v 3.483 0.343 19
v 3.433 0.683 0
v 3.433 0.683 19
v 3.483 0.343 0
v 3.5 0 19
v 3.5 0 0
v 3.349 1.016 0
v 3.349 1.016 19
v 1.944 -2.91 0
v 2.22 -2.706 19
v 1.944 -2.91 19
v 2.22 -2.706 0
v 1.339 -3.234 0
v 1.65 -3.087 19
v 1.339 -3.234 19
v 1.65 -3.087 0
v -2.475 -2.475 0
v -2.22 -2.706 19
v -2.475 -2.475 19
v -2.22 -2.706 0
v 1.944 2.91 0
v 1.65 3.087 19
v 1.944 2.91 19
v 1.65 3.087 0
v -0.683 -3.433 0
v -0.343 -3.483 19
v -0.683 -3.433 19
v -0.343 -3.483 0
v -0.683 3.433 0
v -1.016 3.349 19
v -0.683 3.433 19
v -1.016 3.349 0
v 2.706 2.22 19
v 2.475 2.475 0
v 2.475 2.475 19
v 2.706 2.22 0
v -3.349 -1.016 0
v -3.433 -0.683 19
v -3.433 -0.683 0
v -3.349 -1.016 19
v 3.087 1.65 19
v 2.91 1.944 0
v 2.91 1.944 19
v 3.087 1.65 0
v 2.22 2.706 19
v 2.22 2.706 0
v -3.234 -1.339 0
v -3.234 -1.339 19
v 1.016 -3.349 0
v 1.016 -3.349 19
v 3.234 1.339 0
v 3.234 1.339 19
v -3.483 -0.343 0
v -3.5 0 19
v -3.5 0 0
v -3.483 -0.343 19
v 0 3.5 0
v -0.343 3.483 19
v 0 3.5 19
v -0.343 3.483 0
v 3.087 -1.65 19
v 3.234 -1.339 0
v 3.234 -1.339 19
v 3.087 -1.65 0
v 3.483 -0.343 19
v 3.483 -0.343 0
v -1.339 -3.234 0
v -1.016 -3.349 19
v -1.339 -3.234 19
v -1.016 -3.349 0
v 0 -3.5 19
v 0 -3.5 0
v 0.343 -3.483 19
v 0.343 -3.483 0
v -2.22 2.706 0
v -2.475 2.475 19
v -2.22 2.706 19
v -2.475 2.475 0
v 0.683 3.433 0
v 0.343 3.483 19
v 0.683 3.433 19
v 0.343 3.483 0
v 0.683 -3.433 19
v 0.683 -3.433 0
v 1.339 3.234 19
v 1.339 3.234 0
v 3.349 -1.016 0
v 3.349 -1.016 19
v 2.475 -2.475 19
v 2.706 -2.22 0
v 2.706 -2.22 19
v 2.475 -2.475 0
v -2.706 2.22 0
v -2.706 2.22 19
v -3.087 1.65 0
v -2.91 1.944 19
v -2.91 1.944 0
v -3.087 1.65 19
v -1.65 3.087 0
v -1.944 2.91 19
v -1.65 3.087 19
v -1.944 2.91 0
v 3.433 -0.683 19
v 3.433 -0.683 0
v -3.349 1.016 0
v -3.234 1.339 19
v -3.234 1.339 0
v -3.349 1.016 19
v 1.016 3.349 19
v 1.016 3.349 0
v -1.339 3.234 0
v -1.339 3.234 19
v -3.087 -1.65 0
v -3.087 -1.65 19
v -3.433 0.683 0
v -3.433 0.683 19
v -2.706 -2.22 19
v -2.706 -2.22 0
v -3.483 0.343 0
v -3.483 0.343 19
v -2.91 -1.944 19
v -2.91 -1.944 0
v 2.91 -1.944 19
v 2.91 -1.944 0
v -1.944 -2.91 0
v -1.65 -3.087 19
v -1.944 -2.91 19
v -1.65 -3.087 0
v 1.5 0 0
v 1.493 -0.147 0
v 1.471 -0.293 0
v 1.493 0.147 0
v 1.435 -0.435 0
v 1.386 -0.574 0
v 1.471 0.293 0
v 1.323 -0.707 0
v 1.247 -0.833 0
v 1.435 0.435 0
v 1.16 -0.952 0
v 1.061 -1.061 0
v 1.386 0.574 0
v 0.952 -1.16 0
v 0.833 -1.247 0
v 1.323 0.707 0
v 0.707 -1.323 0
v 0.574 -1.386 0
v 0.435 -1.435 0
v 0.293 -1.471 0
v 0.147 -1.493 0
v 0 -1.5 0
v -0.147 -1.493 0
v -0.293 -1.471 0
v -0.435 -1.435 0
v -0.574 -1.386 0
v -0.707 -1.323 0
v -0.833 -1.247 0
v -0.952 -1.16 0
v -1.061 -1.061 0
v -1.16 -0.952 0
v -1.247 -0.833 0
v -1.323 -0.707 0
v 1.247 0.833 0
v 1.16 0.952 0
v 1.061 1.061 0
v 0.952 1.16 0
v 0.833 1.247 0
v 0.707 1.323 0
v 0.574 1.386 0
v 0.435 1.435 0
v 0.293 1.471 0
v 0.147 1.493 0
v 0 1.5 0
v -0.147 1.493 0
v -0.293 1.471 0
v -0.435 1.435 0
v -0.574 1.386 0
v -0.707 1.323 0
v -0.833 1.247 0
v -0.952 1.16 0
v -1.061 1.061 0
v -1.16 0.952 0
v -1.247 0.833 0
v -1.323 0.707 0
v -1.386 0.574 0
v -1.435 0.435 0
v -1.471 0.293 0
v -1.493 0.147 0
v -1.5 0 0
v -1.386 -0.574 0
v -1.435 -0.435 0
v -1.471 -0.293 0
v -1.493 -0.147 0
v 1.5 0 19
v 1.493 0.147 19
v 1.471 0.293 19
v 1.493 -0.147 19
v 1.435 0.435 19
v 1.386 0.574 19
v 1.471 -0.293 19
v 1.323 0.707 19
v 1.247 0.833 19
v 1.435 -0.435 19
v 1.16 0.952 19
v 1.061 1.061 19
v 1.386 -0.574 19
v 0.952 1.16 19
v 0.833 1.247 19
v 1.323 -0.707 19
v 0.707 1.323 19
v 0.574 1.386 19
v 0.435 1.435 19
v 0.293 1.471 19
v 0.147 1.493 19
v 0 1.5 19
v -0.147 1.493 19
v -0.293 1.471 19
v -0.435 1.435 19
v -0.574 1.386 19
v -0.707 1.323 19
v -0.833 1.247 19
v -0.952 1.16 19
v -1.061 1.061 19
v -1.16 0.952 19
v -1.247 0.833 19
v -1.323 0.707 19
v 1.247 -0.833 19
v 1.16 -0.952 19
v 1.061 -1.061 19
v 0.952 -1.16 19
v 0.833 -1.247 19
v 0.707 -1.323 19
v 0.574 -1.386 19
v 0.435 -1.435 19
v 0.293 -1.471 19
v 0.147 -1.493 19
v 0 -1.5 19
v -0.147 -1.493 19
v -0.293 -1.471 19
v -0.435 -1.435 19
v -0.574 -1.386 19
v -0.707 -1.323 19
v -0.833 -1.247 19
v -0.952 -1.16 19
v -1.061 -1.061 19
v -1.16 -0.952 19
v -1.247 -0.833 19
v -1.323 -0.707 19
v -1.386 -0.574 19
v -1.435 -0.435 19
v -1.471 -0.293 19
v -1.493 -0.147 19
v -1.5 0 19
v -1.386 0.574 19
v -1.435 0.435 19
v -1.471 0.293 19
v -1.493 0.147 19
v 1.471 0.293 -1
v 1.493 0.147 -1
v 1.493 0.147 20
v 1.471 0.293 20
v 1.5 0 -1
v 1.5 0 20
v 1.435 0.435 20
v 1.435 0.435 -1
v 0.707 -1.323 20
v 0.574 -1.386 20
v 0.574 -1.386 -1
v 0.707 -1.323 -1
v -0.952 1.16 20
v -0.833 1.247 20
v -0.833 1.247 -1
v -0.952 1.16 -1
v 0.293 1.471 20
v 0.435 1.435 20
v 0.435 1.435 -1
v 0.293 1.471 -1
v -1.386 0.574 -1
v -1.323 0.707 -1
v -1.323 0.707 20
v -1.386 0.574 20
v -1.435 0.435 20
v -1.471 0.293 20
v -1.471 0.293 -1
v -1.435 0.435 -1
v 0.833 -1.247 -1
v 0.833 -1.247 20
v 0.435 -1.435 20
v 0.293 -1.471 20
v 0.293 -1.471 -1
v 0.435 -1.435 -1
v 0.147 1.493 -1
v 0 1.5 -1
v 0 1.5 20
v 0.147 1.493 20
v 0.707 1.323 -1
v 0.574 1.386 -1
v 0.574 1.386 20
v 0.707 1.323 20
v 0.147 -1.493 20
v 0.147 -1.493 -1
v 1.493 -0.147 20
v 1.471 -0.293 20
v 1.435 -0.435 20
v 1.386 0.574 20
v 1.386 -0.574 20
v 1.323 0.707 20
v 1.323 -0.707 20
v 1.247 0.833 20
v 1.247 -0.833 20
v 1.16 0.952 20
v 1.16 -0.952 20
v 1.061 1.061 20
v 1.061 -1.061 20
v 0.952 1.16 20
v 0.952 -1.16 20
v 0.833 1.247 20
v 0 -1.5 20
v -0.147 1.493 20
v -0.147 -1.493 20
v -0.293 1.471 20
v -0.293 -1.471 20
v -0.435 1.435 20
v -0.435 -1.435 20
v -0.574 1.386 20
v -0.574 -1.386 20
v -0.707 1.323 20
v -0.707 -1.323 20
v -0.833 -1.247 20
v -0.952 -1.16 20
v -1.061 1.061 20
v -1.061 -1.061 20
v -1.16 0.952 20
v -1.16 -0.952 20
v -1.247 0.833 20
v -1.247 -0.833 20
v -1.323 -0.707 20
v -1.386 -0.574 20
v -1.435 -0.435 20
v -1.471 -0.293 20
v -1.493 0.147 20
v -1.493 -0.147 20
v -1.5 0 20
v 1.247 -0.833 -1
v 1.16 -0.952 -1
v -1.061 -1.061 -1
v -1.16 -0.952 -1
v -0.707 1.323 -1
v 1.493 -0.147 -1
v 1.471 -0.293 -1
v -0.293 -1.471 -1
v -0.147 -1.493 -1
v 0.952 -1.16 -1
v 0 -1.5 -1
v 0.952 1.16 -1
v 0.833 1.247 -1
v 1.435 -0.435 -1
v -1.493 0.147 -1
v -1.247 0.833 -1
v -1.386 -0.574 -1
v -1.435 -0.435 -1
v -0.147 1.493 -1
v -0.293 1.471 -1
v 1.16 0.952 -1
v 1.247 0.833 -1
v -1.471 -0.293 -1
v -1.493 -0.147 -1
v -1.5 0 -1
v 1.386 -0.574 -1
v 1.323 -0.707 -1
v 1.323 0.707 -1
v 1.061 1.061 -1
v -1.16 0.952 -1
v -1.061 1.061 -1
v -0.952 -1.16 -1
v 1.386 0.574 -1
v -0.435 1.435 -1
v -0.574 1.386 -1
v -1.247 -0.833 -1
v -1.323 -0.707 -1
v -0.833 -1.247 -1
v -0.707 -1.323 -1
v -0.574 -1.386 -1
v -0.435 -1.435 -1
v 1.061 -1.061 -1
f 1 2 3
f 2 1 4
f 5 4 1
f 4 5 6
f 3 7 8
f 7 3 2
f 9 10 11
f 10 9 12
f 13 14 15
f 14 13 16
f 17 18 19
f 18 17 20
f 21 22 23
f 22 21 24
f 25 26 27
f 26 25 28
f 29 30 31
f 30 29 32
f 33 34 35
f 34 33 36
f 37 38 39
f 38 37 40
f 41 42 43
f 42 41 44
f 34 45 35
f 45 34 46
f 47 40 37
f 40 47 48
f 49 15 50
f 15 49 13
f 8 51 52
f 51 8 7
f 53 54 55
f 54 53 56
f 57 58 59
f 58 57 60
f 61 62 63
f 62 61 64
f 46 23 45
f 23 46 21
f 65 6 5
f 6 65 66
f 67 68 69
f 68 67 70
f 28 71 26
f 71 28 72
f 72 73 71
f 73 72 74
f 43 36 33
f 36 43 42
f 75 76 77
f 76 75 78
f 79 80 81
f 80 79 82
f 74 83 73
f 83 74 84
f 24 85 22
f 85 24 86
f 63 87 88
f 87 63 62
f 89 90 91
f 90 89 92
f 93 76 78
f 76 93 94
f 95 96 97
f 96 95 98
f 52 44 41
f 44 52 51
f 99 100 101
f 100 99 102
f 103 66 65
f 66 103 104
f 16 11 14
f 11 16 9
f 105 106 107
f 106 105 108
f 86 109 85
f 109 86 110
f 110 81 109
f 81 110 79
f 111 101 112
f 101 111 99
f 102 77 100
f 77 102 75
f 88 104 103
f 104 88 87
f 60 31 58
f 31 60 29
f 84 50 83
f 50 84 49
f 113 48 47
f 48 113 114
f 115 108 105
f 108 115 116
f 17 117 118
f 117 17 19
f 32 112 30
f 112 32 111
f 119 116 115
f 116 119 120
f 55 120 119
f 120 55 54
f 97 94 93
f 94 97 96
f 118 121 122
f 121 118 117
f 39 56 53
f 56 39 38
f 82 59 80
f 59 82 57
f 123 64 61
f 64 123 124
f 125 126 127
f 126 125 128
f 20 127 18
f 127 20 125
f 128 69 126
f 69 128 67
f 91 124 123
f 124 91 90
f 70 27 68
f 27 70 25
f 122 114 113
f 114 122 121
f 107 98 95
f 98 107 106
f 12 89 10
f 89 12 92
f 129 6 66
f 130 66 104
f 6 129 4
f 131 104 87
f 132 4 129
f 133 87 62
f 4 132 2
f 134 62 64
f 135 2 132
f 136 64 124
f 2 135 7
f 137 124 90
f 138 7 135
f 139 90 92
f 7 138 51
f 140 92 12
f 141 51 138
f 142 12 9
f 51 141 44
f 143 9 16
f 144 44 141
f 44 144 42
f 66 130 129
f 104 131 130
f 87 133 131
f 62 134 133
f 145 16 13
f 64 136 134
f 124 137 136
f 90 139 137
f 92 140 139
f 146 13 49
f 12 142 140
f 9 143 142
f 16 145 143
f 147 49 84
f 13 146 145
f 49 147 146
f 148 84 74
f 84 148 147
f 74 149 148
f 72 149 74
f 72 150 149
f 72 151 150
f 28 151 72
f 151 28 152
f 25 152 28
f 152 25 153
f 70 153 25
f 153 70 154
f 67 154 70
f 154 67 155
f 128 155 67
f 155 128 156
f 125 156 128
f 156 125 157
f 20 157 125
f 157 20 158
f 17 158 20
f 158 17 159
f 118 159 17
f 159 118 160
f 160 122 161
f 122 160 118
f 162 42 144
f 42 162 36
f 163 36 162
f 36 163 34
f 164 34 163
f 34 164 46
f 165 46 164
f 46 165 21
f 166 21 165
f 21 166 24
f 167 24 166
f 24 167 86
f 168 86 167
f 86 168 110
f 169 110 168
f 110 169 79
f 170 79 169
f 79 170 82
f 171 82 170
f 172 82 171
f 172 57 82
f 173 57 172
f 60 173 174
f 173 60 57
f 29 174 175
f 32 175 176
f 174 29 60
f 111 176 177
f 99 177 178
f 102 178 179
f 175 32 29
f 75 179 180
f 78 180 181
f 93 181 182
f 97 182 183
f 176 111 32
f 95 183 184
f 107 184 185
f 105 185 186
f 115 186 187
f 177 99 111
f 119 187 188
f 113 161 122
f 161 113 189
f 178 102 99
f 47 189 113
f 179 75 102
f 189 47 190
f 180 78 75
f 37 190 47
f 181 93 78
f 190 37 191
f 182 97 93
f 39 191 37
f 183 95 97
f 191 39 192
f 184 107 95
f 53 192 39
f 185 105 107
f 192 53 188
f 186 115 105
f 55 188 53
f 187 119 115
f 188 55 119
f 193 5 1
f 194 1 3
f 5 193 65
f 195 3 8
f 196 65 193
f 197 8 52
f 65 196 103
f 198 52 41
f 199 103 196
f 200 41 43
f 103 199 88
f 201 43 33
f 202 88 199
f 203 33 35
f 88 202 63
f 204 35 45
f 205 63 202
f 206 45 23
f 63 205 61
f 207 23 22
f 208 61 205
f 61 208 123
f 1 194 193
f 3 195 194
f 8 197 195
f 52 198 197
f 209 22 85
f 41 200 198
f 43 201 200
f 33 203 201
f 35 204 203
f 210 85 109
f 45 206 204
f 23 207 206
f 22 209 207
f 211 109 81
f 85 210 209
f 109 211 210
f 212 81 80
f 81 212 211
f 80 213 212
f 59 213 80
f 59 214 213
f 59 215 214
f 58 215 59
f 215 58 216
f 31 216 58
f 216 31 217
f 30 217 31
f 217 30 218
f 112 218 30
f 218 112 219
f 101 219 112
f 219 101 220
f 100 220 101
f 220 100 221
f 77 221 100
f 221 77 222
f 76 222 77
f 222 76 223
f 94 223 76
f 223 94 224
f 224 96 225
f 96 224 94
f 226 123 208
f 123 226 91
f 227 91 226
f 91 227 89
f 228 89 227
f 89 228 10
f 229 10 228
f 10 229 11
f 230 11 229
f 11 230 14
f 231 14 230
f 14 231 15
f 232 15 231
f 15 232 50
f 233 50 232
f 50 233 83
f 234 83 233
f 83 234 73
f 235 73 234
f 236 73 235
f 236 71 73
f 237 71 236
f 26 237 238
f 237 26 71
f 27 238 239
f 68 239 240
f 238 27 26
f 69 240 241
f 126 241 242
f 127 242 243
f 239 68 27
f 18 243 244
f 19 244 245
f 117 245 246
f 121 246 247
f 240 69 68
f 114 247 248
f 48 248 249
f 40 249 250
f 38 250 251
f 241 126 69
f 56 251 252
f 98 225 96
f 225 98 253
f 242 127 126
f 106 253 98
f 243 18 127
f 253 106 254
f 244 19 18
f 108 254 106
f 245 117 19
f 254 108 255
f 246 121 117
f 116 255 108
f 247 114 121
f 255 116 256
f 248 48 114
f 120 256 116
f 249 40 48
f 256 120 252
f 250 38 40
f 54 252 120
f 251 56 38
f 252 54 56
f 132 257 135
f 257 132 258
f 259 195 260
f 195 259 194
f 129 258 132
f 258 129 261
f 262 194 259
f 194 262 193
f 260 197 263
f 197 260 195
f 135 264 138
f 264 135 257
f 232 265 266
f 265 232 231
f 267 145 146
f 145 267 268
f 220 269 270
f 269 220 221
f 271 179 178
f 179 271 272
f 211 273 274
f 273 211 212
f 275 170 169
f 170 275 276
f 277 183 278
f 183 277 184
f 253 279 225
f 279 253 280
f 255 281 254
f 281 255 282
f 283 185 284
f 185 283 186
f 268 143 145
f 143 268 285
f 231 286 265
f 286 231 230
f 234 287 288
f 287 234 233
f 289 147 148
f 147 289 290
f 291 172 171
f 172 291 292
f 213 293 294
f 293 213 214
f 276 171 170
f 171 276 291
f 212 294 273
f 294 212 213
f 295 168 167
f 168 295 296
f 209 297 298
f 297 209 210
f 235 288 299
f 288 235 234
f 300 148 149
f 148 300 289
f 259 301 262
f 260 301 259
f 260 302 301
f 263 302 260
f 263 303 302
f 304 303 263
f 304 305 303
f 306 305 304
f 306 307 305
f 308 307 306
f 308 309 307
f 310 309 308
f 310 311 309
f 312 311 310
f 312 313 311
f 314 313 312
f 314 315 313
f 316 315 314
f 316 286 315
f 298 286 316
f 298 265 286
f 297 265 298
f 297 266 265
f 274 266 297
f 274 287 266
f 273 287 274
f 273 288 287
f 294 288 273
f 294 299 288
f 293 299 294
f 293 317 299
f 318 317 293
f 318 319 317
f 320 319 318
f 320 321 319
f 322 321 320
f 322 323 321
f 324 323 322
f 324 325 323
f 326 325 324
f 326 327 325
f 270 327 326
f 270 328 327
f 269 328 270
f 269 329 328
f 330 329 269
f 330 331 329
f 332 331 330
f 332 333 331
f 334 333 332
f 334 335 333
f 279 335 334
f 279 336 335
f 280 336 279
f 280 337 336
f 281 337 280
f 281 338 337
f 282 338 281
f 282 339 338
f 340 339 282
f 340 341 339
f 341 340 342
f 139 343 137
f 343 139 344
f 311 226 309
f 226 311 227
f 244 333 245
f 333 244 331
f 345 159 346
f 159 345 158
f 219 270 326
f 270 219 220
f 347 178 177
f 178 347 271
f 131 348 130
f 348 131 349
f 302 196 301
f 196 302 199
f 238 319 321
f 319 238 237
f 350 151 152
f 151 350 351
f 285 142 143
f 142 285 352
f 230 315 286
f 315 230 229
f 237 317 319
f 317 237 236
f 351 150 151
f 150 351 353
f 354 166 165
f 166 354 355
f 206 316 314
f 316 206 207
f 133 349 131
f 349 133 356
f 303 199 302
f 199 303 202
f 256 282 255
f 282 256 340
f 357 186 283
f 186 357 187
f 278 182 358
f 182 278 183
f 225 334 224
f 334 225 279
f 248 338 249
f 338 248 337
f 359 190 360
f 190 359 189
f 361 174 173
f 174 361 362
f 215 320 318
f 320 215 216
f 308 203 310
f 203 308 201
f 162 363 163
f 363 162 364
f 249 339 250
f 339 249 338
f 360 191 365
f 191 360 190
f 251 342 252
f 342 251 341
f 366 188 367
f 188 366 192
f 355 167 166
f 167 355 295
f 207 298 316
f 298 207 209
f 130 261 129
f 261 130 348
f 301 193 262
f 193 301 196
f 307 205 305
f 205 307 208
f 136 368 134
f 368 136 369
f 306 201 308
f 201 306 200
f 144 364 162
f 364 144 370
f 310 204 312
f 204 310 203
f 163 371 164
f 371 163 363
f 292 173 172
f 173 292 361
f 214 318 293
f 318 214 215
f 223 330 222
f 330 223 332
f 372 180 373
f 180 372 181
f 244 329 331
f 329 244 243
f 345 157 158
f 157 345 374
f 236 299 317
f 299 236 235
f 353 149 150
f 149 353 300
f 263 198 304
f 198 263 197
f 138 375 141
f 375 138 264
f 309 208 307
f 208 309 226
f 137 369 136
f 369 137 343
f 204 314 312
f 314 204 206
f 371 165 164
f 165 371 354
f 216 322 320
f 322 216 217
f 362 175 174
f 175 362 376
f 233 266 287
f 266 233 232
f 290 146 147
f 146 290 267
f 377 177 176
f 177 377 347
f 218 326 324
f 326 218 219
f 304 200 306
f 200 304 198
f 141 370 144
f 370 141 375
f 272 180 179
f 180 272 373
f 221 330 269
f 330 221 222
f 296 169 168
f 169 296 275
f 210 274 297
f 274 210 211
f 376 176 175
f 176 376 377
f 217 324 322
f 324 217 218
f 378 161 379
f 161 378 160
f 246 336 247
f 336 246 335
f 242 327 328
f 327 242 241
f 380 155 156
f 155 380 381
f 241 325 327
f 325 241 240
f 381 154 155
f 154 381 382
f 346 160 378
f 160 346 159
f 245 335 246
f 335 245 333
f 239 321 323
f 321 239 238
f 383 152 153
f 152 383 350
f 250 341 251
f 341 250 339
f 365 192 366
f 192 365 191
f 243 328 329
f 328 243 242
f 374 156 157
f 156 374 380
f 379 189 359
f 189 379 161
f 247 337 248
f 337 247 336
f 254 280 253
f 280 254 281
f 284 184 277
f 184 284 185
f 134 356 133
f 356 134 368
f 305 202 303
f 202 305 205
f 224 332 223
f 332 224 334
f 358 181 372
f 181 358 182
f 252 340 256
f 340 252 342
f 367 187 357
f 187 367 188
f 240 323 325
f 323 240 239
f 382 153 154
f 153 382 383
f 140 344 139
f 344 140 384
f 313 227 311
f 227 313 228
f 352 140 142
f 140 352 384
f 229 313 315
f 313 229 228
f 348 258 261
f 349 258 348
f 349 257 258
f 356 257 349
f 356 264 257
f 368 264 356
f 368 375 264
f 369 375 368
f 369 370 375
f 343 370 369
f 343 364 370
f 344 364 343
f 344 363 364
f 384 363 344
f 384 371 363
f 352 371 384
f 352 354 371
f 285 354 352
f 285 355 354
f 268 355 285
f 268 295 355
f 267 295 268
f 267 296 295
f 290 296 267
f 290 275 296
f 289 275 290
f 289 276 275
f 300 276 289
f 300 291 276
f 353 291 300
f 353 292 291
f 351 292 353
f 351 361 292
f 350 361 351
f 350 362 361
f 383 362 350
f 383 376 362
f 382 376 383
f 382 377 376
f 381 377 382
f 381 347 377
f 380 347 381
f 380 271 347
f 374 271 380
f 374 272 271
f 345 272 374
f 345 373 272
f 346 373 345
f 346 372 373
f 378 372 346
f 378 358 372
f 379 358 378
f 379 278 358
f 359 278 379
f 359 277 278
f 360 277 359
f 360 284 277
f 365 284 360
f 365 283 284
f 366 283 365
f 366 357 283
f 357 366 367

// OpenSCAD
cylinder(h=19.0, d=7.0, $fn=64);
translate([0, 0, -1])
cylinder(h=21.0, d=3.0, $fn=64);
